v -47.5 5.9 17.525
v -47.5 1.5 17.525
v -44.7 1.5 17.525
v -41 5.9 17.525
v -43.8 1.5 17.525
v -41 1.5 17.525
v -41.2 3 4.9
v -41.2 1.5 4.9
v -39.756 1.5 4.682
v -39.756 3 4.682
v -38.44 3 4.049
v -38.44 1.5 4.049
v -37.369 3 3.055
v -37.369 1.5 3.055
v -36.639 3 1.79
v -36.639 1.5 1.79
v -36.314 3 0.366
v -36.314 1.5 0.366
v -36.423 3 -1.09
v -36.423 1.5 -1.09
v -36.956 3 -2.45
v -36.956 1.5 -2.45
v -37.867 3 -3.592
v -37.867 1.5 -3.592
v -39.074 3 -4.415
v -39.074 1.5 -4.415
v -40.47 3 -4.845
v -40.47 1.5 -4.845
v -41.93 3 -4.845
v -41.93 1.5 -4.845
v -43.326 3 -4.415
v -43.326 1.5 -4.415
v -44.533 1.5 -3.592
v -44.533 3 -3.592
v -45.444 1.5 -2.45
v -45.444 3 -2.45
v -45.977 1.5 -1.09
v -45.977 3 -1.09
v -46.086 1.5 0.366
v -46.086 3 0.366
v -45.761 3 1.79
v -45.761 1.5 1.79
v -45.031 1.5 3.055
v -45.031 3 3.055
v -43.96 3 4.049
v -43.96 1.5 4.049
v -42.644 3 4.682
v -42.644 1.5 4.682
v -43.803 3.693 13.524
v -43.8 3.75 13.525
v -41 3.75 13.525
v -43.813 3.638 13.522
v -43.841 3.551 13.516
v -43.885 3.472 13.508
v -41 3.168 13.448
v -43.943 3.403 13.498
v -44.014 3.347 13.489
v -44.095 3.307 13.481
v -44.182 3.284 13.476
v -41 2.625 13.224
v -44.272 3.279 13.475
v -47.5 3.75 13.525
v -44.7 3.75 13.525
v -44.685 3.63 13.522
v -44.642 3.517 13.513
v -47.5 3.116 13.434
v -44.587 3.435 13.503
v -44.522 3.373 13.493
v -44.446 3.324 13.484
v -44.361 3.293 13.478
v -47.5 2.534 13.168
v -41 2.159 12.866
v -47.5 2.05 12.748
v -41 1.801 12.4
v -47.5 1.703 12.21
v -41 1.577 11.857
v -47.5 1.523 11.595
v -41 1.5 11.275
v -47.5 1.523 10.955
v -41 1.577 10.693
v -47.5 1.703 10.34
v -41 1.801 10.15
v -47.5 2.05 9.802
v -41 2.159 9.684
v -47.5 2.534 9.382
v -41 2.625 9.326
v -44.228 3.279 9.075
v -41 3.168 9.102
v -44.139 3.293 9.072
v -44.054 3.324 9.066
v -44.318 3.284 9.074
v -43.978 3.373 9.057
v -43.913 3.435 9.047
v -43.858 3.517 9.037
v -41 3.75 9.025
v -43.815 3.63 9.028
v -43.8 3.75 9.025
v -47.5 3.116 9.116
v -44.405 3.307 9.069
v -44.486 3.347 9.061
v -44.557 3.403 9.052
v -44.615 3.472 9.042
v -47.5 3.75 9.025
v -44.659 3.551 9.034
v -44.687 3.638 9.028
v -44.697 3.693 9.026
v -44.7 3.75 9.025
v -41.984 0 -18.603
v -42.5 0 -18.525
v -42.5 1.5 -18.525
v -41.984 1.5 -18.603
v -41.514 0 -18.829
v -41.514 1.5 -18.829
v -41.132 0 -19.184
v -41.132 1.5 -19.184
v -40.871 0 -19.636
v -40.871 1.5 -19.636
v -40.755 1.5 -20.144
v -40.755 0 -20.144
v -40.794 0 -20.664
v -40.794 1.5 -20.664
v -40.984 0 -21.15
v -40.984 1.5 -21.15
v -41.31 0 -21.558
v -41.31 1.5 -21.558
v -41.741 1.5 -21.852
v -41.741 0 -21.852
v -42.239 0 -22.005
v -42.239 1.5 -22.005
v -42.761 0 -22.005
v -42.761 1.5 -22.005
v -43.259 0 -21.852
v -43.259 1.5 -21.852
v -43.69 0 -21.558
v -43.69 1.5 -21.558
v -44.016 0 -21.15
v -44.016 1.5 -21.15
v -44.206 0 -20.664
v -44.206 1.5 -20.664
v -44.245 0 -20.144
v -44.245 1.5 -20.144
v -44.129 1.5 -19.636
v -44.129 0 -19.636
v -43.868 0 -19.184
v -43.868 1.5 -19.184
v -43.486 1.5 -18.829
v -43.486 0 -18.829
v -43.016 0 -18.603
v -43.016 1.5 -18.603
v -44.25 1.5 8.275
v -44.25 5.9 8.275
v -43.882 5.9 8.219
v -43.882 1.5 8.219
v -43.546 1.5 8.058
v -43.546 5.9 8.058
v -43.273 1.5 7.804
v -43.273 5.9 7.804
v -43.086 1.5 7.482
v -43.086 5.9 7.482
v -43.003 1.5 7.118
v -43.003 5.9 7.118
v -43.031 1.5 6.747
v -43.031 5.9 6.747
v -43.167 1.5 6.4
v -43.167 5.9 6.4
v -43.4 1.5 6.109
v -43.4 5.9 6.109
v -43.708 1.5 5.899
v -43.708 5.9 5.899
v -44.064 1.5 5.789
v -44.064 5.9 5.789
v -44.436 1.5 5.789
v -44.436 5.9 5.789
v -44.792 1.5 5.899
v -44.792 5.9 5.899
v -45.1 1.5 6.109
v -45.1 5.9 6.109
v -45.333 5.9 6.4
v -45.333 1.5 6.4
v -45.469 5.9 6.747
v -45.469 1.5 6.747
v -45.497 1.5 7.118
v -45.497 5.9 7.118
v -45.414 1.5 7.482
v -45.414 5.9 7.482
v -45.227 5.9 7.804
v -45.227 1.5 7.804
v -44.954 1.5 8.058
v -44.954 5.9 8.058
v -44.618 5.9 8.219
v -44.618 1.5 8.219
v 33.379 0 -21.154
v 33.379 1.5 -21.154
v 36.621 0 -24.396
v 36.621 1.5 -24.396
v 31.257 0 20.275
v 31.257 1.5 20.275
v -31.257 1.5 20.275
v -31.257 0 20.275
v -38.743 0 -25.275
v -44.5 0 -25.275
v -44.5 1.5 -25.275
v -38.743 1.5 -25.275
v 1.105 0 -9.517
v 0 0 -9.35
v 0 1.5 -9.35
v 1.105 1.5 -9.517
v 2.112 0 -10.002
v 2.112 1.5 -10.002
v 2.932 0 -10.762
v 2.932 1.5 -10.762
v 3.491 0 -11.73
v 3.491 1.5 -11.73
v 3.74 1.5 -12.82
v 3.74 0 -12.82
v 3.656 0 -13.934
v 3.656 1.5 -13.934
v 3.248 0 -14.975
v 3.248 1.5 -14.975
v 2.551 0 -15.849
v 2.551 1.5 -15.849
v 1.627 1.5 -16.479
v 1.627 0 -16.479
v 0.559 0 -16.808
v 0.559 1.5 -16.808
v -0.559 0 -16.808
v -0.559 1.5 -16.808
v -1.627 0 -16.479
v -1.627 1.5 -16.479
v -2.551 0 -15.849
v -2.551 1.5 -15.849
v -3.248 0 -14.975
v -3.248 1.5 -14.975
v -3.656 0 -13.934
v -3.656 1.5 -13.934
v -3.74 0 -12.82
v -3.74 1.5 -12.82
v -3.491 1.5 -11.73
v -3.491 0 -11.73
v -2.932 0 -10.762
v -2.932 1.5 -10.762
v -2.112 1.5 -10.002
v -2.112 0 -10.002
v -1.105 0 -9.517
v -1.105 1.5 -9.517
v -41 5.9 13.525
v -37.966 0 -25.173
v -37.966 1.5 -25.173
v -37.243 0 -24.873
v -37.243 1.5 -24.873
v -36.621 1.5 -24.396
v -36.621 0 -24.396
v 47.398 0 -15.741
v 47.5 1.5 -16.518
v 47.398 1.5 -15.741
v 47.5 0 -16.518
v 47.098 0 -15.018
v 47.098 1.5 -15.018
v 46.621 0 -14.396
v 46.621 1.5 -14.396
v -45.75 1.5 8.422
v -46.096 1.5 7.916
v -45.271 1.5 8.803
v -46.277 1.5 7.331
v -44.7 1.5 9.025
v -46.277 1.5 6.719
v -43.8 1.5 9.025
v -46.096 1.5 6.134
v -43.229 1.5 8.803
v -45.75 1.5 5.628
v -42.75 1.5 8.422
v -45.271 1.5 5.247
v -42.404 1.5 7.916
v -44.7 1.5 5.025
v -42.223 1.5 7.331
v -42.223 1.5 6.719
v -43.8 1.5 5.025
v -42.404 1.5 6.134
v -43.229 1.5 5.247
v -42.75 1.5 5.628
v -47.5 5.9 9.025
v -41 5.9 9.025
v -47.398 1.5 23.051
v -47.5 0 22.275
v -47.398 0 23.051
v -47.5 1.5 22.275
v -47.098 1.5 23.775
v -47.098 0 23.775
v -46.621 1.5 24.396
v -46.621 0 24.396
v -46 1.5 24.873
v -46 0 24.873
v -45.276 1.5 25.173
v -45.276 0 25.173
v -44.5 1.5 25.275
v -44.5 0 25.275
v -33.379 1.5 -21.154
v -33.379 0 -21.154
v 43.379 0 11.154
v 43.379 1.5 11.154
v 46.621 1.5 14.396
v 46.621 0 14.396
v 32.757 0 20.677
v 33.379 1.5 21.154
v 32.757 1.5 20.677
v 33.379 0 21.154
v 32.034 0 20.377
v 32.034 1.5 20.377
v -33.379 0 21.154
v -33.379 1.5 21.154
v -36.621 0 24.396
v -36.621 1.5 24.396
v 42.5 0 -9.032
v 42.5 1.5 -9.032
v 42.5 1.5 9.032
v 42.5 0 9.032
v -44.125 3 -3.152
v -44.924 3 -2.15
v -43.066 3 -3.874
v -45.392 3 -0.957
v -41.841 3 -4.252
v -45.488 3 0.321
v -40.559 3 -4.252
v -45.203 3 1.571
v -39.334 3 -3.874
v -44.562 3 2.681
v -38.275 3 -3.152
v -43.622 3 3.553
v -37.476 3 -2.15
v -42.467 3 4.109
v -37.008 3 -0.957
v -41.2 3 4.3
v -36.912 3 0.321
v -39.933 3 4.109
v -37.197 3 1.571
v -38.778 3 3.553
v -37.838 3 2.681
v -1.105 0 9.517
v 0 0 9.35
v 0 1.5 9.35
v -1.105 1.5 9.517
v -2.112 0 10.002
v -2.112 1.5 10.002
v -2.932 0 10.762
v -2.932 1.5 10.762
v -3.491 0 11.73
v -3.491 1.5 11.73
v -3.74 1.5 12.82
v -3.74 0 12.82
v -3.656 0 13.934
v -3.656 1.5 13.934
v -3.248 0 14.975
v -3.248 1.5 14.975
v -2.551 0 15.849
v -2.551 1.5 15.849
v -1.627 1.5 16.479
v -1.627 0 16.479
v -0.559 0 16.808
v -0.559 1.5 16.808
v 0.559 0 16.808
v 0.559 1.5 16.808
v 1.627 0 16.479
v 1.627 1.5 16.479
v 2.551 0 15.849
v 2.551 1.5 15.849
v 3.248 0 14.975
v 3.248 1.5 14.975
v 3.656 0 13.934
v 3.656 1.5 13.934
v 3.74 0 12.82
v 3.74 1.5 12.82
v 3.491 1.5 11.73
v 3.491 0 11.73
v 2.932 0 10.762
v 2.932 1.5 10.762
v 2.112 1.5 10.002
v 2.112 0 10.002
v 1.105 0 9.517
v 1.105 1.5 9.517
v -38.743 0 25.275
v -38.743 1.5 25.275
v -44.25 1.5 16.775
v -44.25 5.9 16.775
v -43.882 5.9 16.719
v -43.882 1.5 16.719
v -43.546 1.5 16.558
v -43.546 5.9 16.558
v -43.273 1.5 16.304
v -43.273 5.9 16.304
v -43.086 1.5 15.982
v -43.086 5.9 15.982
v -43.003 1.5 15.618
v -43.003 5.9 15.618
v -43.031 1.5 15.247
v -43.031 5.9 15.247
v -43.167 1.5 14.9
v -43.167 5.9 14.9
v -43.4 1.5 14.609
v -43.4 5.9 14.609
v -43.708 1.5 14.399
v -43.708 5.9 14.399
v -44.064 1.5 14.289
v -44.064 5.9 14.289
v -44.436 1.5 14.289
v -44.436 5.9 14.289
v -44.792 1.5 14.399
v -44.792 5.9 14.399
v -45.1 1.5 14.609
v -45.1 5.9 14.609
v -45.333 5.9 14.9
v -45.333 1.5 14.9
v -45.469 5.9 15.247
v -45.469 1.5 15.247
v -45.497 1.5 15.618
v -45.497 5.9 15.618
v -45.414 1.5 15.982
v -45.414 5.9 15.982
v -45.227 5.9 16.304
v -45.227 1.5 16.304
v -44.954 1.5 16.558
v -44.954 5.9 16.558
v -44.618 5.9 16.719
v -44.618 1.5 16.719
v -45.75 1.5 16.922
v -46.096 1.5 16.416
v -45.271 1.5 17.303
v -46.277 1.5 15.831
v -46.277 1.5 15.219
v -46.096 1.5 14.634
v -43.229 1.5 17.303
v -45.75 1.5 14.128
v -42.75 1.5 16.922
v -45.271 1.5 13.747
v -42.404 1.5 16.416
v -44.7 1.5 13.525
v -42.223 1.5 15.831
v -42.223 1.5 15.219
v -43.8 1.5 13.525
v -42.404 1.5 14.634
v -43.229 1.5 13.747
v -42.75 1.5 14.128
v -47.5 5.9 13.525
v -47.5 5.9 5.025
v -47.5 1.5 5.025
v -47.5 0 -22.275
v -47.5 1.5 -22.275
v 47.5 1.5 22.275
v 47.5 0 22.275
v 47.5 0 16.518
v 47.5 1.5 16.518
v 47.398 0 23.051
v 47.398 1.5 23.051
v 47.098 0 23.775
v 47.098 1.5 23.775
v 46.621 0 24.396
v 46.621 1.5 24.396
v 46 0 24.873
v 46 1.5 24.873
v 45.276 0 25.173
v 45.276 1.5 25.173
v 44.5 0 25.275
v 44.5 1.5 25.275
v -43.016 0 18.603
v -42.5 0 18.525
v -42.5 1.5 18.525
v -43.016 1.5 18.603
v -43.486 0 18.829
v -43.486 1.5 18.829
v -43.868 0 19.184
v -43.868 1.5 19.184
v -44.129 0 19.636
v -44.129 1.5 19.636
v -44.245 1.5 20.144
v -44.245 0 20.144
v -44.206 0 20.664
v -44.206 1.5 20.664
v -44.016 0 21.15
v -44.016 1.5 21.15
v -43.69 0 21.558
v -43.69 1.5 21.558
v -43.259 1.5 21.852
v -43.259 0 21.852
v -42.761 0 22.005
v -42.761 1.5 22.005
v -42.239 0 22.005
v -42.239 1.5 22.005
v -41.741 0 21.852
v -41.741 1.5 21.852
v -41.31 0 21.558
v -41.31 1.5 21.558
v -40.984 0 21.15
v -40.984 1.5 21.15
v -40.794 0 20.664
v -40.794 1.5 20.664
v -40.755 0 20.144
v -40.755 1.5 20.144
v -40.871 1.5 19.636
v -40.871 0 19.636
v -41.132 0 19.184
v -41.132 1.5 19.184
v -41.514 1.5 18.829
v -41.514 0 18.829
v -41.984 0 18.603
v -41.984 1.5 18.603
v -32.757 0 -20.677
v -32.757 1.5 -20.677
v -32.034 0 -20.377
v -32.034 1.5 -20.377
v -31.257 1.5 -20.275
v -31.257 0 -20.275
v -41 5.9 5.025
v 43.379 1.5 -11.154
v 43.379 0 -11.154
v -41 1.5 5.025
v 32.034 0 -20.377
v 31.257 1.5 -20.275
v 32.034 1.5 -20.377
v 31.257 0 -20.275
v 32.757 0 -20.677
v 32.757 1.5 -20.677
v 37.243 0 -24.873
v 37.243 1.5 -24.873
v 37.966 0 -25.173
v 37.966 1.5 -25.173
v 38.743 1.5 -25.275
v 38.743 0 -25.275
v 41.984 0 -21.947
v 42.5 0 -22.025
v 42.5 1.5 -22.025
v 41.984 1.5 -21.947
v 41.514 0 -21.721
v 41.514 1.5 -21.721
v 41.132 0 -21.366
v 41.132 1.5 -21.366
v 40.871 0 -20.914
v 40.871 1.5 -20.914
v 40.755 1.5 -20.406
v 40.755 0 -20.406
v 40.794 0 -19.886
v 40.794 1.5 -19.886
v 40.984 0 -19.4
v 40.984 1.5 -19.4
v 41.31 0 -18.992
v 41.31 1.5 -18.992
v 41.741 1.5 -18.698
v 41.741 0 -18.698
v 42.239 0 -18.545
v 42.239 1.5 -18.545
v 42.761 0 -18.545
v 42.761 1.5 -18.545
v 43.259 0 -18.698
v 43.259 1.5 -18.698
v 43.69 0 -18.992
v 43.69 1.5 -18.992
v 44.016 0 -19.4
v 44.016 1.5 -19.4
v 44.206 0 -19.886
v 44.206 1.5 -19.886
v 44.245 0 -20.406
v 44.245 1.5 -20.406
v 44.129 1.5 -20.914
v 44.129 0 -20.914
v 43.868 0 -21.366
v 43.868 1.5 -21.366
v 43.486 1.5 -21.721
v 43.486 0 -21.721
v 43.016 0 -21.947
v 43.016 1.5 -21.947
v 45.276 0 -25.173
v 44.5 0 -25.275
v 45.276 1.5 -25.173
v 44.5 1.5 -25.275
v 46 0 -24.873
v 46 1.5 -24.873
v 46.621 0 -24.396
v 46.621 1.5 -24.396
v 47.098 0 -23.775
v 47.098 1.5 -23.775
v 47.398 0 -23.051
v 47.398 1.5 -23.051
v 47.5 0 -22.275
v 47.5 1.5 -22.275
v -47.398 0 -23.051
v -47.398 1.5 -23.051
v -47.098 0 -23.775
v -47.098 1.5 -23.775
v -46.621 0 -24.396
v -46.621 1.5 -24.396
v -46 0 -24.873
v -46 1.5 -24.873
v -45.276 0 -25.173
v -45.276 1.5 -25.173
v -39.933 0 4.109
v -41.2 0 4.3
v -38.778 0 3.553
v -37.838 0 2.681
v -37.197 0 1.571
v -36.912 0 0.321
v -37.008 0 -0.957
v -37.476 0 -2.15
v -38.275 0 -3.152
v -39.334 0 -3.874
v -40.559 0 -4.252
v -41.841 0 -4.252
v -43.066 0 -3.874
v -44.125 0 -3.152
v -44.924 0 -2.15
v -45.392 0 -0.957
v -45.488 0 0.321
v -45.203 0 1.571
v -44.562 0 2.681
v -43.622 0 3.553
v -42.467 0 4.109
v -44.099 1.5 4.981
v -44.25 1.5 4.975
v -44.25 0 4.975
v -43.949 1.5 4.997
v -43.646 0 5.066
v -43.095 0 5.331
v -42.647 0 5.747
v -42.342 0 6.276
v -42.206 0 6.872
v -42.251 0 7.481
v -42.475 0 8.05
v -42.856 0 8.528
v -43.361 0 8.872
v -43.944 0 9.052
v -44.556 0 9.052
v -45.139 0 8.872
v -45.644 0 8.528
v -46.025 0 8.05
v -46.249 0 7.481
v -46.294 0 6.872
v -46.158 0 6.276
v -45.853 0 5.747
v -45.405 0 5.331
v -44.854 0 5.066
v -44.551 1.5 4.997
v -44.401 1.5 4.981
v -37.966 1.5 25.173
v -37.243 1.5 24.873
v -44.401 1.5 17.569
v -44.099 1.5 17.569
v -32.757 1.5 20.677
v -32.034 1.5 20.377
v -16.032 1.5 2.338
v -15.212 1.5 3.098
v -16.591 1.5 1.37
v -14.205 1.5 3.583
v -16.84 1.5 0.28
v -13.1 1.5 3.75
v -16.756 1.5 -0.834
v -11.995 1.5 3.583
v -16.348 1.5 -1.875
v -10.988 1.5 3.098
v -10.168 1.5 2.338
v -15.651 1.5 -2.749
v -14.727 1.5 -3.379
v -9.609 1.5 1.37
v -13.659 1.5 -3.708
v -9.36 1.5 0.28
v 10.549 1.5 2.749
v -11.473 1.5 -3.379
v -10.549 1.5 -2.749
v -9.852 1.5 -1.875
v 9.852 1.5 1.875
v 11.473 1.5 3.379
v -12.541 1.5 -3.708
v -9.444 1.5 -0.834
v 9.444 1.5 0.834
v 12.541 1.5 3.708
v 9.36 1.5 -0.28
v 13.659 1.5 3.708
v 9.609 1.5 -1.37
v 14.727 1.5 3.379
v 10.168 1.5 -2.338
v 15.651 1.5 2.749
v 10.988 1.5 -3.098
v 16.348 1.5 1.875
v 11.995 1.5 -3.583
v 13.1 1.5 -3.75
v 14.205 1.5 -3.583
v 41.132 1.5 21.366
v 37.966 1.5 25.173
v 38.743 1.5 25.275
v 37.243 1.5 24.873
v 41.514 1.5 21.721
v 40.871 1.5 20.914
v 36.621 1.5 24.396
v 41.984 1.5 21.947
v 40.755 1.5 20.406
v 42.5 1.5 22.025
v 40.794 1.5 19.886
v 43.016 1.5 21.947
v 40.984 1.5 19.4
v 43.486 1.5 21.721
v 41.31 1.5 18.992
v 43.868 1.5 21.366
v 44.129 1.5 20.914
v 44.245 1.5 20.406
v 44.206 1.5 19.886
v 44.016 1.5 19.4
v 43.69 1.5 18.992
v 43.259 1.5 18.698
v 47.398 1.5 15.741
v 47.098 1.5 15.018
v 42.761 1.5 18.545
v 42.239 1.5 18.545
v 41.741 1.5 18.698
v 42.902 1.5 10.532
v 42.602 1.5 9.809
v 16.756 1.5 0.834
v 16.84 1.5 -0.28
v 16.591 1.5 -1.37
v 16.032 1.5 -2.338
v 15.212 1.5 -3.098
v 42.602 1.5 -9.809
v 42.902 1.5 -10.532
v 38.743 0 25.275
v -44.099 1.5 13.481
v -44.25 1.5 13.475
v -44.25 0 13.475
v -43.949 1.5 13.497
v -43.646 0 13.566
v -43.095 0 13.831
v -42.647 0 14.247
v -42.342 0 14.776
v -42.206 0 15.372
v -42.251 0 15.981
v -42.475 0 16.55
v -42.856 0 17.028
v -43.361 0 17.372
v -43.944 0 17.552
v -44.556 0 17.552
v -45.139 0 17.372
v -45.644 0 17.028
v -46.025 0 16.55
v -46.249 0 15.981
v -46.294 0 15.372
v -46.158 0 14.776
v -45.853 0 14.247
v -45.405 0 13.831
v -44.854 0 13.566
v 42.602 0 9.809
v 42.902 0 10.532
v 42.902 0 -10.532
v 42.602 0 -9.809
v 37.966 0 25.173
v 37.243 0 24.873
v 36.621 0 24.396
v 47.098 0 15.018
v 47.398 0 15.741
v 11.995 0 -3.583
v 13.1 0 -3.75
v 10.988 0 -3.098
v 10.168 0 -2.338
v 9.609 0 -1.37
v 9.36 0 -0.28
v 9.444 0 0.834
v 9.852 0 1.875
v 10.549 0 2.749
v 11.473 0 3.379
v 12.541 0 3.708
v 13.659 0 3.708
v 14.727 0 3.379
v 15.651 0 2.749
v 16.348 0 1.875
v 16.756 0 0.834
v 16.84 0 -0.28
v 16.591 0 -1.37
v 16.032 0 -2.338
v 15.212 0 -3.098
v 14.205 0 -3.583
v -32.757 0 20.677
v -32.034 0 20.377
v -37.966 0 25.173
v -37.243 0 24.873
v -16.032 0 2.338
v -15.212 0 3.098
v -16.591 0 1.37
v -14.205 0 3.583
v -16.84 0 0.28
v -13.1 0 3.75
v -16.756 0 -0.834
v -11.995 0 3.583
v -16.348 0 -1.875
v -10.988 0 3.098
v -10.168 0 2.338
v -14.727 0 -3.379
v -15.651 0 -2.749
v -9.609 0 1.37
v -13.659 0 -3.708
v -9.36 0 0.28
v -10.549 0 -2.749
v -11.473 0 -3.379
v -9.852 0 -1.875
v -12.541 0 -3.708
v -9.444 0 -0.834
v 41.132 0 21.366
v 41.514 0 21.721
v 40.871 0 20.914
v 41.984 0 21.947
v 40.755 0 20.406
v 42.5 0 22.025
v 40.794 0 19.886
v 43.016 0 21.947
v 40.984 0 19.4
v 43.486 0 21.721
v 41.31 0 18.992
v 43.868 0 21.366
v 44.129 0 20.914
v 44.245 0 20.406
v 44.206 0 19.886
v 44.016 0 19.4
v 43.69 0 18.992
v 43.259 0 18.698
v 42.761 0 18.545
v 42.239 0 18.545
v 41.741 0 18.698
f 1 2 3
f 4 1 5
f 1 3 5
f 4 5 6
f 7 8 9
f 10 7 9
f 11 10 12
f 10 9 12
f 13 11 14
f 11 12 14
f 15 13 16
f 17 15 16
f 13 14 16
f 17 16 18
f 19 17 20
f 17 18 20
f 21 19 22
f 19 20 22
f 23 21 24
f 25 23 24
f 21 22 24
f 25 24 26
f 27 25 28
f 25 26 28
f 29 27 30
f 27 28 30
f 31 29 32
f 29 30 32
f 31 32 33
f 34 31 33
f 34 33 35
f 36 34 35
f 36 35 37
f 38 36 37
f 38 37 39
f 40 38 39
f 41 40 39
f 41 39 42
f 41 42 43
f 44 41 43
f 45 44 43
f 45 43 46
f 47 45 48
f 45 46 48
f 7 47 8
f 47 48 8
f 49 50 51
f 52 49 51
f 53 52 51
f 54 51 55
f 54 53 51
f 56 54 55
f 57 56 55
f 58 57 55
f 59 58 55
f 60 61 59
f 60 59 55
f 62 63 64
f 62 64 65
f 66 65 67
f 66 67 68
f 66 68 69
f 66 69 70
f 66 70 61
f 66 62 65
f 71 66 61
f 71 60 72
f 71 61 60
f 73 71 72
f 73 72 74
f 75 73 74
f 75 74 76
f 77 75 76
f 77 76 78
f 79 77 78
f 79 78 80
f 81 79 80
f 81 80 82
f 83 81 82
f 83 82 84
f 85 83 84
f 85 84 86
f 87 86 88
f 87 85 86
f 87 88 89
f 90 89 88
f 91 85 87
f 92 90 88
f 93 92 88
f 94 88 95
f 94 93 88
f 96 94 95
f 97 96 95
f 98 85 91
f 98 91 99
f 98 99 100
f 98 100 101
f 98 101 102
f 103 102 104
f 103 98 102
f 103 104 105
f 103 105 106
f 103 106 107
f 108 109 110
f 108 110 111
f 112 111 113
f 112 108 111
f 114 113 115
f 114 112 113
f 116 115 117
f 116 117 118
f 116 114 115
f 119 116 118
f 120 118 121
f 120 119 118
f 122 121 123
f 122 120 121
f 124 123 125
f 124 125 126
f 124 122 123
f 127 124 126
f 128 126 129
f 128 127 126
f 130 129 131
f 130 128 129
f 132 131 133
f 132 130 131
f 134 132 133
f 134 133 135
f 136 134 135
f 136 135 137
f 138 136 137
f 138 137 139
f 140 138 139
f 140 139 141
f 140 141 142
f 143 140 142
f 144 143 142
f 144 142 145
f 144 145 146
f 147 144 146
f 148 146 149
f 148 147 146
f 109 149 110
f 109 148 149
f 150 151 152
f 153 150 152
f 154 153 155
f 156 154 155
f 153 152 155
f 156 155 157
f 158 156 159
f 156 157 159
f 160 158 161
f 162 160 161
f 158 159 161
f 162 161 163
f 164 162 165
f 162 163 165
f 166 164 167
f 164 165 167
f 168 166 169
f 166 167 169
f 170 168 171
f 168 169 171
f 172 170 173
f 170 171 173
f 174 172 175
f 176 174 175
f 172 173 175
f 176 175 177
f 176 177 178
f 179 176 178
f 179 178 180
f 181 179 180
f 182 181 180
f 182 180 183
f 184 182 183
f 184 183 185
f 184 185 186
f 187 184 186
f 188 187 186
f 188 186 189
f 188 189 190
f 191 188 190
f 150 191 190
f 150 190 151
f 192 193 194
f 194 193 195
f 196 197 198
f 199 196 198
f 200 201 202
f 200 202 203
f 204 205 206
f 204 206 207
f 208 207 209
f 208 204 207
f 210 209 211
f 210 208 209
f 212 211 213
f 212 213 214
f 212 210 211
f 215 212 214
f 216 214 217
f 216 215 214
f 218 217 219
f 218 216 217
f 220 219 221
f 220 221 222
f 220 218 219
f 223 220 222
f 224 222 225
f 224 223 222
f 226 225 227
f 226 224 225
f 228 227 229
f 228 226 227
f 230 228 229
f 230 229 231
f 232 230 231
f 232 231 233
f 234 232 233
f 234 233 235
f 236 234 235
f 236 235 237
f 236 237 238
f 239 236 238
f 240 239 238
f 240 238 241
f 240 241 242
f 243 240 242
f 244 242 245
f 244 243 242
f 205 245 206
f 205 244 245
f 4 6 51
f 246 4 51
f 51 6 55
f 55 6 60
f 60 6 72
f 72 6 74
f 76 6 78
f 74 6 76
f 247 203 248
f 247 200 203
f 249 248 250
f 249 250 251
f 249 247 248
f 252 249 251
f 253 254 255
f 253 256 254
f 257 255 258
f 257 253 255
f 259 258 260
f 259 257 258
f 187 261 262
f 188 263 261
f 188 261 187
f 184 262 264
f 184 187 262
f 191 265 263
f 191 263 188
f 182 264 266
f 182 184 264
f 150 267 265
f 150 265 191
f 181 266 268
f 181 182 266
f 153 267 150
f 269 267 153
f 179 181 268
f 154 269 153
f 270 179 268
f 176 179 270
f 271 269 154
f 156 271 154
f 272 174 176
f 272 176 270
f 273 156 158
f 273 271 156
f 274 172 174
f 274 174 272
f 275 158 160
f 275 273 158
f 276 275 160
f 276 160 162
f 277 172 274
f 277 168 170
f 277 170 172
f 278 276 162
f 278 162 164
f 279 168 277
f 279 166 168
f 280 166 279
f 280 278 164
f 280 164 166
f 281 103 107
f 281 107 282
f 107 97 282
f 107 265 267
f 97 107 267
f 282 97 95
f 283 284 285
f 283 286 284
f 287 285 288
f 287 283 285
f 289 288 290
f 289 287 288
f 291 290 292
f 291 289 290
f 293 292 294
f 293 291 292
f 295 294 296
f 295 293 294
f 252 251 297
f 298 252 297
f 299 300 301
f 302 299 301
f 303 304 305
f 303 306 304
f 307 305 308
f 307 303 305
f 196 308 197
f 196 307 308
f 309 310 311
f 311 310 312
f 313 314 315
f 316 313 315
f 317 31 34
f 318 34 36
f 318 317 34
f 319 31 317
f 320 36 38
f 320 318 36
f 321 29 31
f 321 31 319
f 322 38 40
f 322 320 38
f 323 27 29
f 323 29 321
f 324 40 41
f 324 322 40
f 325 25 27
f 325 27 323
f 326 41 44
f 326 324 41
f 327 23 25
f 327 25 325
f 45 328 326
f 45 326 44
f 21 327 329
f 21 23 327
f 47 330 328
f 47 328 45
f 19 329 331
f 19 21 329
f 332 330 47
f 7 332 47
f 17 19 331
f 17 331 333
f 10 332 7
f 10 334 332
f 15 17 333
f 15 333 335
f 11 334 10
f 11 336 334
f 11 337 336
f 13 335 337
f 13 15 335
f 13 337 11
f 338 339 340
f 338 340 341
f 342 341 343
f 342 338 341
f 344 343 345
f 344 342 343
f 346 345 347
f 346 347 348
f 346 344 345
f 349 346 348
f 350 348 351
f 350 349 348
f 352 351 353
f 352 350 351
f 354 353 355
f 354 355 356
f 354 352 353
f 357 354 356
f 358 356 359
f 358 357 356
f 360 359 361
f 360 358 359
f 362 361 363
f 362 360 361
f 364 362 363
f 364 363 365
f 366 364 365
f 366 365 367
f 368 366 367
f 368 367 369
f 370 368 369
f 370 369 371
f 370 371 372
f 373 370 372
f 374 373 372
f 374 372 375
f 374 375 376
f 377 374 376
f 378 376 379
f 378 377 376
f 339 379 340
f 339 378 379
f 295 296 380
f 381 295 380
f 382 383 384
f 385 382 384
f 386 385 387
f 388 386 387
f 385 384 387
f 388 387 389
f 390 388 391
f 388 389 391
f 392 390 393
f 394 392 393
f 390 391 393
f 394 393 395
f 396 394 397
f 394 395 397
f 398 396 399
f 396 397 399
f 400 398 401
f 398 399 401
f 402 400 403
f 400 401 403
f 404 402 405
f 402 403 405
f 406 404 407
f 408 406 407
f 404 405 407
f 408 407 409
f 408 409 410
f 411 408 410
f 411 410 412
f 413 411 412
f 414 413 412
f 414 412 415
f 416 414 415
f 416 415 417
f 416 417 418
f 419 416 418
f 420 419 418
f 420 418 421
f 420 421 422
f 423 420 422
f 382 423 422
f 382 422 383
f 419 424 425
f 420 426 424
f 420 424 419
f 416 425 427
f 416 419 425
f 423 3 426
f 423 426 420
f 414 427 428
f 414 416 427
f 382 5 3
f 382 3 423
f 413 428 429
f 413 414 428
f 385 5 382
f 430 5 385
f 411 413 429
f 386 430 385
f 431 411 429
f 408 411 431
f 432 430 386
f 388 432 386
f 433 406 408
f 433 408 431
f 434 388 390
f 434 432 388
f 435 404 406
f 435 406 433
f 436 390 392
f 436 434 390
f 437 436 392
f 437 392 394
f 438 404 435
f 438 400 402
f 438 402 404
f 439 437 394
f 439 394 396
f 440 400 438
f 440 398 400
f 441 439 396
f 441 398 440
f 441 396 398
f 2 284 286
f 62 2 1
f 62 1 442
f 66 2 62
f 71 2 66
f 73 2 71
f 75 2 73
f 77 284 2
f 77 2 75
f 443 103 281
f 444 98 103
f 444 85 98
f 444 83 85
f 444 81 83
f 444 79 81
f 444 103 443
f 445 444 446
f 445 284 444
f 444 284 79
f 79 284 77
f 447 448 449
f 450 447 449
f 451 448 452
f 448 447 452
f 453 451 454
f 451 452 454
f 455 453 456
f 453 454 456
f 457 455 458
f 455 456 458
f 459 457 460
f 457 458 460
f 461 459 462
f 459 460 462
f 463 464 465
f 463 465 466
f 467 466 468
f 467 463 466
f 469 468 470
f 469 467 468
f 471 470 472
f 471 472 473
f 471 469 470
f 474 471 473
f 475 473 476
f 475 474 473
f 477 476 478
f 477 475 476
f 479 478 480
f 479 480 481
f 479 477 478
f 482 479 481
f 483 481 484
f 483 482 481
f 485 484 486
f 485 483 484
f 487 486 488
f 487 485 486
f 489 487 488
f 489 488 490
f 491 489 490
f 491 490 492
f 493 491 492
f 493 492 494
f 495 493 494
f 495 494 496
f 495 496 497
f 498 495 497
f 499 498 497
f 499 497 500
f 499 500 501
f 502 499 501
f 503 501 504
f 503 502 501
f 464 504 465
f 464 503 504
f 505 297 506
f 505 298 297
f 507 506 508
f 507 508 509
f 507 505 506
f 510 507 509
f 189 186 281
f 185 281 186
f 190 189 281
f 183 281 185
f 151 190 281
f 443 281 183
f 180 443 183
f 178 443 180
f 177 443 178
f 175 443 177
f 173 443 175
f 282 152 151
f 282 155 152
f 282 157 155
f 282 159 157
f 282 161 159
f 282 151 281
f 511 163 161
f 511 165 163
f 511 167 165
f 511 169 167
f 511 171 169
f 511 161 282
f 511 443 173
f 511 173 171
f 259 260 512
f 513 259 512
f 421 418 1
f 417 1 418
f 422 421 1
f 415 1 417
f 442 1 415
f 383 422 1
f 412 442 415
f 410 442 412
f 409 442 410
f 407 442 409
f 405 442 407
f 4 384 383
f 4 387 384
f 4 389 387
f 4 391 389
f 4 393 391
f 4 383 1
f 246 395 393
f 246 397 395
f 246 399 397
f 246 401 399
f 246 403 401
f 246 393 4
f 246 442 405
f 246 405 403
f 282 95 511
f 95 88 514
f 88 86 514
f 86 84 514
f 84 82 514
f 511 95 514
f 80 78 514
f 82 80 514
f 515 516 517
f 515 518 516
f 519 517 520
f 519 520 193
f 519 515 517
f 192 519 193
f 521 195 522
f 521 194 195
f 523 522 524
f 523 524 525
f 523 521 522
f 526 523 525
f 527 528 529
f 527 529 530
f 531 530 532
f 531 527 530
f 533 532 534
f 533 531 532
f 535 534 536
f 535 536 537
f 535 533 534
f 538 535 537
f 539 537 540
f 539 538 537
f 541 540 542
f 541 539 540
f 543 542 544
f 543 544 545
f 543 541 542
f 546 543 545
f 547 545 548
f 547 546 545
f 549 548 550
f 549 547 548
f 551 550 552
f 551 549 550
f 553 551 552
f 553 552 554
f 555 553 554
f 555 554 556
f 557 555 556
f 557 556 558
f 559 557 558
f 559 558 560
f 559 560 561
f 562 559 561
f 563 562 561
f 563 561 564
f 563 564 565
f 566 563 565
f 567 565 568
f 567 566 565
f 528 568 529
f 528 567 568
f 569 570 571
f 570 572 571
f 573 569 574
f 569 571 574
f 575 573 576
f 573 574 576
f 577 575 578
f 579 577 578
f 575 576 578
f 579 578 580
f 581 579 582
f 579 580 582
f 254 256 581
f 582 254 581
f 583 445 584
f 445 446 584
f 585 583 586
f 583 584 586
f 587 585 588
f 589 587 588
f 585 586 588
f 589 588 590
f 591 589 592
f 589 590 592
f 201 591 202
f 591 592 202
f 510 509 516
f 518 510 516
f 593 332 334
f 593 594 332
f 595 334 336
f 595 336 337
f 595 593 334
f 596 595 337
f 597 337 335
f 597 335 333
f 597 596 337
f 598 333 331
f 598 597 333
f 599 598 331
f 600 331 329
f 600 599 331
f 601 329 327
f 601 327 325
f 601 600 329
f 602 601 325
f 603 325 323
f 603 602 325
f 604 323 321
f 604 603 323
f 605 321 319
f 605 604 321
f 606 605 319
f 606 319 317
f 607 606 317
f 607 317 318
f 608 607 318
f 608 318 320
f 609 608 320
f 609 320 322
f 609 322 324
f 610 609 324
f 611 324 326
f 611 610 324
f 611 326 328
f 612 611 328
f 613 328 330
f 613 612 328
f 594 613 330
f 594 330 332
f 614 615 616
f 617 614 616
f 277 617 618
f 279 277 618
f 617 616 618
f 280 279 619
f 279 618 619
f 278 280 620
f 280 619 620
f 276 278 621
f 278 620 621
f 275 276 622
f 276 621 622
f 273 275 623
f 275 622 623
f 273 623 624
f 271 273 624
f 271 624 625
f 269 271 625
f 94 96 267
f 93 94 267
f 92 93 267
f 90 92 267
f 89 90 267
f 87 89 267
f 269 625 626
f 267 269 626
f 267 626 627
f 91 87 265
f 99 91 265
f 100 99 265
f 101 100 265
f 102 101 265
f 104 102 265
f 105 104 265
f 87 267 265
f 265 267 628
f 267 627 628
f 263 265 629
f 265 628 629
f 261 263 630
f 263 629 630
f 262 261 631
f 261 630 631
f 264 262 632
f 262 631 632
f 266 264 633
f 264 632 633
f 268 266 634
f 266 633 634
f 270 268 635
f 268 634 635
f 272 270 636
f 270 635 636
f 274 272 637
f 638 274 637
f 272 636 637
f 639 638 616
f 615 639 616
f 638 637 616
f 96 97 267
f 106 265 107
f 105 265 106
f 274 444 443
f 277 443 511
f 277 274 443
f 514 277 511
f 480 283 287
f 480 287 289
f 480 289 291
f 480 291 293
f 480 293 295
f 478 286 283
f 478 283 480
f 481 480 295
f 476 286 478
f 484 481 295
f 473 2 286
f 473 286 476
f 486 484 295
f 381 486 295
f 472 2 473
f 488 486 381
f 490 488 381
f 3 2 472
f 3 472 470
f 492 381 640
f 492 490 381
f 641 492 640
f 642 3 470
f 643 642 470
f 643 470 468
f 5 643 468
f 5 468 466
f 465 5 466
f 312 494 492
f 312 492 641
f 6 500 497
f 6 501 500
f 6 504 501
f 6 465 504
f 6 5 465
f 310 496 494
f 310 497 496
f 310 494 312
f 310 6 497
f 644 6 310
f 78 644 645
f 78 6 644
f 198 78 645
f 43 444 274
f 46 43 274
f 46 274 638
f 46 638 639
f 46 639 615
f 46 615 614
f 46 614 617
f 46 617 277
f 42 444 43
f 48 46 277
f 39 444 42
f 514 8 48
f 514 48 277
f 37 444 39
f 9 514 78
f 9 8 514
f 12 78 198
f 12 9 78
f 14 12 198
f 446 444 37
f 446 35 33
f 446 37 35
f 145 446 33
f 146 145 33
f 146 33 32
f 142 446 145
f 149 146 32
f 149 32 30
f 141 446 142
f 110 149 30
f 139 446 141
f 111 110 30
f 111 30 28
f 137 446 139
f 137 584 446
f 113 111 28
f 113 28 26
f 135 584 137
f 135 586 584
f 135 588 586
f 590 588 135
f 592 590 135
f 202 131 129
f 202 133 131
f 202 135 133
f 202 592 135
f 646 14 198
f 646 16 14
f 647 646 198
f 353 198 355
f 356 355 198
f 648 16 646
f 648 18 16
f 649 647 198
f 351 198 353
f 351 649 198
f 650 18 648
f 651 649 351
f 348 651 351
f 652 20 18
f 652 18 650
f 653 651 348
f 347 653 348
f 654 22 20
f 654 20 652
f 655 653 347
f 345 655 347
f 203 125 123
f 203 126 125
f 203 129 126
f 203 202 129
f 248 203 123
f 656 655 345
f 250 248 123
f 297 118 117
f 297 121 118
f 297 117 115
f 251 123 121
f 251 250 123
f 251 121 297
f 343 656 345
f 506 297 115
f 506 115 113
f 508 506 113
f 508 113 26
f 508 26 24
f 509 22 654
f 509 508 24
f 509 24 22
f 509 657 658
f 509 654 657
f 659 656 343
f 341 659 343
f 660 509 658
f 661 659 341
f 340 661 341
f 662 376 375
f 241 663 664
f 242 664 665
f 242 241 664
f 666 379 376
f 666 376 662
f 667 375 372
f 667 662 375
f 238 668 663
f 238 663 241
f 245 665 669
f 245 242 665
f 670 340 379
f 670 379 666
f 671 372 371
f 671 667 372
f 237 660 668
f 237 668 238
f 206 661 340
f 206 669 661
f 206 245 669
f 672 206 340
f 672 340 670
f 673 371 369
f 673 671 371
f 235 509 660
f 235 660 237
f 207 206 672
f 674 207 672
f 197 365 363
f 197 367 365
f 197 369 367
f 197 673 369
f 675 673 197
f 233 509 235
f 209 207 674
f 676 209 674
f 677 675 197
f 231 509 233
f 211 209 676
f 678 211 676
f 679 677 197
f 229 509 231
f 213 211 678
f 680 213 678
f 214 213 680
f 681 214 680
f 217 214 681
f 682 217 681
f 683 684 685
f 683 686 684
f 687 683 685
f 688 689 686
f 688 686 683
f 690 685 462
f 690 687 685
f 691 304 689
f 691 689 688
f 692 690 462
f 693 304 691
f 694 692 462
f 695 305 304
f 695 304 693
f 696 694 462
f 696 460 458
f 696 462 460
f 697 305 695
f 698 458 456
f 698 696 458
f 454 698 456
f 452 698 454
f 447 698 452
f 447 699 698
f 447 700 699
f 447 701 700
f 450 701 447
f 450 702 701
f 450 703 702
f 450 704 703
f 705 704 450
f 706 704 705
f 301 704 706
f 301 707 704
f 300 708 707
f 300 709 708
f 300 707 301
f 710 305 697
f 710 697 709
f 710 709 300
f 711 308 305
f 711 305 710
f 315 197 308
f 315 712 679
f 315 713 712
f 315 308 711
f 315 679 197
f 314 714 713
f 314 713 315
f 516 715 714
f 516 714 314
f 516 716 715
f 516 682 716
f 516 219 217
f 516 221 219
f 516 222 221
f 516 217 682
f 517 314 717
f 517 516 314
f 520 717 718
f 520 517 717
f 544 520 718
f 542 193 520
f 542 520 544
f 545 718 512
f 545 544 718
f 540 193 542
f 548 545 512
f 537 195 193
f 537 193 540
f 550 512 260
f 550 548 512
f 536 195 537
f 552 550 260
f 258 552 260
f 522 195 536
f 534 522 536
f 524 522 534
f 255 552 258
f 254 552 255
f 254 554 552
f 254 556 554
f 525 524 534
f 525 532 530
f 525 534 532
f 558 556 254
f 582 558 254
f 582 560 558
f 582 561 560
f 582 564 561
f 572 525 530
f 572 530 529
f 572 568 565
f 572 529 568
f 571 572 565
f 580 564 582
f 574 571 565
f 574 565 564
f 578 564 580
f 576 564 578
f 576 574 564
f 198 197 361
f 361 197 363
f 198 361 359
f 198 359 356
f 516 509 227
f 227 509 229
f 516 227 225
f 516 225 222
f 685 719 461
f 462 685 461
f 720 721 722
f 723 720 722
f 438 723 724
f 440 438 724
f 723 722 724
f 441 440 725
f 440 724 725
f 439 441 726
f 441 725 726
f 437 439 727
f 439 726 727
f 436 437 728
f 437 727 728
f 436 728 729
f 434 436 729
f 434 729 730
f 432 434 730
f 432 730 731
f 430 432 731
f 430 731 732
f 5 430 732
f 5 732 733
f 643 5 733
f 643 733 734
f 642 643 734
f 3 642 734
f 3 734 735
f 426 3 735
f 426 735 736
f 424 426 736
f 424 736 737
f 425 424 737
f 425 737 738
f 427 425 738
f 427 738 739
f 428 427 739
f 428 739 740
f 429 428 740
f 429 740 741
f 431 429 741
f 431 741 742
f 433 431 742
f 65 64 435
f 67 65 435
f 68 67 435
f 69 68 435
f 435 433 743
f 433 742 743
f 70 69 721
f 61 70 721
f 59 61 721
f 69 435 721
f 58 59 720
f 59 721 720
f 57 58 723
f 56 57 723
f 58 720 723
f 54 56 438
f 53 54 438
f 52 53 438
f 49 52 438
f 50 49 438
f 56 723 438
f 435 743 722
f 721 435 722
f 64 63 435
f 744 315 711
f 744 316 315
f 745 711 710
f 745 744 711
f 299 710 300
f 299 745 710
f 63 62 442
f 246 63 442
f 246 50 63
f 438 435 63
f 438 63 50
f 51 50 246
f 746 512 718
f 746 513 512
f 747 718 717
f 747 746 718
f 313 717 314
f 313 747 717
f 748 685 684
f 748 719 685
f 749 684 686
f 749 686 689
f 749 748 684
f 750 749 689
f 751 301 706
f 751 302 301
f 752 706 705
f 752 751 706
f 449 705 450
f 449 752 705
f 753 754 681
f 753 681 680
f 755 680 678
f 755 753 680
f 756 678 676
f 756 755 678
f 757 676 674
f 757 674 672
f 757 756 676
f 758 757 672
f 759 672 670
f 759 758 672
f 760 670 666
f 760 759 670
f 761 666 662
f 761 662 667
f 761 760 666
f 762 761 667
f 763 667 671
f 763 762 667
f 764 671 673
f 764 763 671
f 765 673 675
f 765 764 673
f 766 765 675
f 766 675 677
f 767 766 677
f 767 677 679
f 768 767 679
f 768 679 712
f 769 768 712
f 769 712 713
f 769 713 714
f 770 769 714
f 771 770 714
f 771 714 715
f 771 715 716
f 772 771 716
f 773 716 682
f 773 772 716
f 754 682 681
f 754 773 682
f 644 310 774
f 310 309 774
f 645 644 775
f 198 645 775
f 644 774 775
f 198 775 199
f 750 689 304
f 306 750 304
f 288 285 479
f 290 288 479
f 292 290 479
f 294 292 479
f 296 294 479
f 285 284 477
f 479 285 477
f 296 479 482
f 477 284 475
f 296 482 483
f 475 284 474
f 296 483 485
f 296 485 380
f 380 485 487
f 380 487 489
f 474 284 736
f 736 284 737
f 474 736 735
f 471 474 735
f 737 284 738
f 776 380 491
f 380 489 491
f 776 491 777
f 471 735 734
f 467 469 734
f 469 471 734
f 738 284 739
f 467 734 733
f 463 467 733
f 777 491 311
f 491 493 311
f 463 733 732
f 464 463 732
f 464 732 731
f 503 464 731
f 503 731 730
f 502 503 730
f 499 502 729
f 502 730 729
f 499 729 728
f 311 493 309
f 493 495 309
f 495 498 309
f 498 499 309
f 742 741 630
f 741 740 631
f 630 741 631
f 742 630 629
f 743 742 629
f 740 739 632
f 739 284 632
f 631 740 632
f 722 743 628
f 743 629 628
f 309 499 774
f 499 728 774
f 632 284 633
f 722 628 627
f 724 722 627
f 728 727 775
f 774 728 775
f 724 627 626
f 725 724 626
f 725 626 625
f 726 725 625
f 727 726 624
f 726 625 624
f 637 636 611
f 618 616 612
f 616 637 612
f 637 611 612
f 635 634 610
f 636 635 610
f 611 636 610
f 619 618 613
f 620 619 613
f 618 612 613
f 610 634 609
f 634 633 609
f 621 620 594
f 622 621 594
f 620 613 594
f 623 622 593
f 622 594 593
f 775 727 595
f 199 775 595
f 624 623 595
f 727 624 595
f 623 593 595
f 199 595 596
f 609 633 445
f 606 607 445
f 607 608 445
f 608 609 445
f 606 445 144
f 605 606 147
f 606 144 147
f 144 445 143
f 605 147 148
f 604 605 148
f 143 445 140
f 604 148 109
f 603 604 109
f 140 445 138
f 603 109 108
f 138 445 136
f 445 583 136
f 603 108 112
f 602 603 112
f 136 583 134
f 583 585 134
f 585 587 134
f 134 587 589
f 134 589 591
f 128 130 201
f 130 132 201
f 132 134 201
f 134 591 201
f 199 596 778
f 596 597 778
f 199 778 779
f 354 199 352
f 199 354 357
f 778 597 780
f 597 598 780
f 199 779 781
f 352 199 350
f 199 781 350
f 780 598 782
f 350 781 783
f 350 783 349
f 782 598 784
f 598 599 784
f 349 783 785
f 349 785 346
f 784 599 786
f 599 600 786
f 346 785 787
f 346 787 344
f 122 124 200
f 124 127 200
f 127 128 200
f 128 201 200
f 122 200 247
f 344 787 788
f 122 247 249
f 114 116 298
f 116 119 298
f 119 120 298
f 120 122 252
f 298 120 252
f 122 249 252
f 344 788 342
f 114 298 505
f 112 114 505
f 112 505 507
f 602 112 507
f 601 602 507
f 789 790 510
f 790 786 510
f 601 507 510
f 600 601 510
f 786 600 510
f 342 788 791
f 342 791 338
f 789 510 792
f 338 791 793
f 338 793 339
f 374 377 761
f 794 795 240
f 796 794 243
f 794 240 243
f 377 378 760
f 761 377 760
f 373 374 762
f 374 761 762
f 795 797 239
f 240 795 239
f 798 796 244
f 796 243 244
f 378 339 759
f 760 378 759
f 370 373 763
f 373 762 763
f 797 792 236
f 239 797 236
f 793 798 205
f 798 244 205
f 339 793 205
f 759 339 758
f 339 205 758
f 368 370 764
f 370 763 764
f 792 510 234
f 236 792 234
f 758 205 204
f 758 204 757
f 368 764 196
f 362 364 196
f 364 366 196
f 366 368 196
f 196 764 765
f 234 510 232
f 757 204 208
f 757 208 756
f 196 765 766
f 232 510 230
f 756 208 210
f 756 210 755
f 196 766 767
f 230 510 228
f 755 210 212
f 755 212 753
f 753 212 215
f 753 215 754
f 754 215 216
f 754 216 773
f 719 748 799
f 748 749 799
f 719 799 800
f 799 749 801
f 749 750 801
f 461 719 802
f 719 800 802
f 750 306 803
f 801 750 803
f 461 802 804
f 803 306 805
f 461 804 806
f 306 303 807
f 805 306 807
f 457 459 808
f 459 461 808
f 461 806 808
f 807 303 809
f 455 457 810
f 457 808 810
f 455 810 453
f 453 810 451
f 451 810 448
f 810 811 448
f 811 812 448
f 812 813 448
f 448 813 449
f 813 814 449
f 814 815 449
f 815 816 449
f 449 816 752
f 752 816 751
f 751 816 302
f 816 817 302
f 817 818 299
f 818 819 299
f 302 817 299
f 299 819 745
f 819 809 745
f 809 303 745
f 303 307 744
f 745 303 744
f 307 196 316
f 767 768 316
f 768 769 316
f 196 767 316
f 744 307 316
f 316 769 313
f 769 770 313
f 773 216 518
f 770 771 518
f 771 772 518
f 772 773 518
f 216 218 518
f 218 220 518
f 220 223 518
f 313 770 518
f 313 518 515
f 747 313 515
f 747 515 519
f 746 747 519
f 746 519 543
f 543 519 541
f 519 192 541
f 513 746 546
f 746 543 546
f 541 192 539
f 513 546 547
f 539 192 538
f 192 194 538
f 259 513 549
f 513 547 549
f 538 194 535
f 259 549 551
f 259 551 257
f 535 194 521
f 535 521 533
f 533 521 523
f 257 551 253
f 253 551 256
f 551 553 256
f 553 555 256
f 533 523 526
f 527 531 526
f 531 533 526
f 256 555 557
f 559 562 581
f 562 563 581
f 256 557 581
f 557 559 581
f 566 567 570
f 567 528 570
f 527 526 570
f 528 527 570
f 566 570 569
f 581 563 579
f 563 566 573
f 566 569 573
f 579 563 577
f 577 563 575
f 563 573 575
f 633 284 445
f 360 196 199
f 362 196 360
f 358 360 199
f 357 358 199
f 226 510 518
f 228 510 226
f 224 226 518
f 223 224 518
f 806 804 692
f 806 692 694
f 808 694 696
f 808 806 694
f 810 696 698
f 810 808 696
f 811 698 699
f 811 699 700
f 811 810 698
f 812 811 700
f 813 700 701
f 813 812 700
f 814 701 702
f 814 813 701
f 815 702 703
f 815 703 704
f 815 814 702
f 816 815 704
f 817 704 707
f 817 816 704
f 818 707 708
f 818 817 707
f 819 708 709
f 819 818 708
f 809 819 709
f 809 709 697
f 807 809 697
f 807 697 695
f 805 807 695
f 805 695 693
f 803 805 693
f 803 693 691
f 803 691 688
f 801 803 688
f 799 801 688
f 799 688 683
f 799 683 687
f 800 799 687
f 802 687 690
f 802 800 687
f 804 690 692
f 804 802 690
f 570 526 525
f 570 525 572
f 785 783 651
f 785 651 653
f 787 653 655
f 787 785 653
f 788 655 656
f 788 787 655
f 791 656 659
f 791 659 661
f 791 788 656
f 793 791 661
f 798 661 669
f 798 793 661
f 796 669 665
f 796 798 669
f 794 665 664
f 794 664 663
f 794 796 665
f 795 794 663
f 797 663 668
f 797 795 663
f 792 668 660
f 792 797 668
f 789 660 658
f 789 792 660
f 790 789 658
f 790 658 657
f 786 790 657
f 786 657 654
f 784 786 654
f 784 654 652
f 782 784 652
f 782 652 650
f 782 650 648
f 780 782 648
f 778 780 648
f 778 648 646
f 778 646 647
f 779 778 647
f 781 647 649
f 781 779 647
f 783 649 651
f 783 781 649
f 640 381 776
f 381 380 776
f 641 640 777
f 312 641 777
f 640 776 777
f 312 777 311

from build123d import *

# Parameters (mm, degrees)
SKETCH1_W           = 95
SKETCH1_H           = 50.55
SKETCH1_R           = 1.75
SKETCH1_R_2         = 3.75
SKETCH1_R_3         = 4.3
BOSS_EXTRUDE1_DEPTH = 1.5
CUT_EXTRUDE1_DEPTH  = 1.5
FILLET1_R           = 3
SKETCH3_R           = 4.9
SKETCH3_R_2         = 4.3
BOSS_EXTRUDE2_DEPTH = 1.5
SKETCH5_W           = 6.5
SKETCH5_H           = 4
BOSS_EXTRUDE3_DEPTH = 4.4
CUT_EXTRUDE2_REACH  = 56.128
SKETCH6_R           = 1.25
SKETCH8_R           = 2.05
CUT_EXTRUDE3_DEPTH  = 1.5
FILLET2_R           = 2.25


with BuildPart() as part:
    # Sketch1 → Boss-Extrude1 (new body)
    with BuildSketch(Plane(origin=(0, 0, 0), x_dir=(1, 0, 0), z_dir=(0, 1, 0))):
        Rectangle(SKETCH1_W, SKETCH1_H)
        with Locations(Location((-42.5, 20.275, 0), (0, 0, 270))):
            Circle(SKETCH1_R, mode=Mode.SUBTRACT)
        with Locations(Location((42.5, 20.275, 0), (0, 0, 90))):
            Circle(SKETCH1_R, mode=Mode.SUBTRACT)
        with Locations(Location((42.5, -20.275, 0), (0, 0, 270))):
            Circle(SKETCH1_R, mode=Mode.SUBTRACT)
        with Locations(Location((-42.5, -20.275, 0), (0, 0, 90))):
            Circle(SKETCH1_R, mode=Mode.SUBTRACT)
        with Locations(Location((-13.1, 0, 0), (0, 0, 270))):
            Circle(SKETCH1_R_2, mode=Mode.SUBTRACT)
        with Locations(Location((13.1, 0, 0), (0, 0, 90))):
            Circle(SKETCH1_R_2, mode=Mode.SUBTRACT)
        with Locations(Location((0, 13.1, 0), (0, 0, 270))):
            Circle(SKETCH1_R_2, mode=Mode.SUBTRACT)
        with Locations(Location((0, -13.1, 0), (0, 0, 90))):
            Circle(SKETCH1_R_2, mode=Mode.SUBTRACT)
        with Locations(Location((-41.2, 0, 0), (0, 0, 270))):
            Circle(SKETCH1_R_3, mode=Mode.SUBTRACT)
    extrude(amount=BOSS_EXTRUDE1_DEPTH)

    # Sketch2 → Cut-Extrude1 (cut)
    with BuildSketch(Plane(origin=(0, 1.5, 0), x_dir=(1, 0, 0), z_dir=(0, 1, 0))):
        Polygon((-32.5, 20.275), (32.5, 20.275), (37.5, 25.275), (-37.5, 25.275), align=None)
        Polygon((37.5, -25.275), (32.5, -20.275), (-32.5, -20.275), (-37.5, -25.275), align=None)
        Polygon((47.5, -15.275), (47.5, 15.275), (42.5, 10.275), (42.5, -10.275), align=None)
    extrude(amount=-CUT_EXTRUDE1_DEPTH, mode=Mode.SUBTRACT)

    # Fillet1
    fillet1_edges = [part.edges().sort_by_distance(p)[0] for p in [
        (37.5, 0.75, -25.275),
        (32.5, 0.75, -20.275),
        (-32.5, 0.75, -20.275),
        (-37.5, 0.75, -25.275),
        (-37.5, 0.75, 25.275),
        (-32.5, 0.75, 20.275),
        (32.5, 0.75, 20.275),
        (37.5, 0.75, 25.275),
        (47.5, 0.75, 25.275),
        (-47.5, 0.75, 25.275),
        (-47.5, 0.75, -25.275),
        (47.5, 0.75, -25.275),
        (47.5, 0.75, 15.275),
        (42.5, 0.75, 10.275),
        (42.5, 0.75, -10.275),
        (47.5, 0.75, -15.275),
    ]]
    fillet(fillet1_edges, radius=FILLET1_R)

    # Sketch3 → Boss-Extrude2 (add)
    with BuildSketch(Plane(origin=(0, 1.5, 0), x_dir=(1, 0, 0), z_dir=(0, 1, 0))):
        with Locations(Location((-41.2, 0, 0), (0, 0, 270))):
            Circle(SKETCH3_R)
        with Locations(Location((-41.2, 0, 0), (0, 0, 270))):
            Circle(SKETCH3_R_2, mode=Mode.SUBTRACT)
    extrude(amount=BOSS_EXTRUDE2_DEPTH)

    # Sketch5 → Boss-Extrude3 (add)
    with BuildSketch(Plane(origin=(0, 1.5, 0), x_dir=(1, 0, 0), z_dir=(0, 1, 0))):
        with Locations((-44.25, -7.025)):
            Rectangle(SKETCH5_W, SKETCH5_H)
        with Locations((-44.25, -15.525)):
            Rectangle(SKETCH5_W, SKETCH5_H)
    extrude(amount=BOSS_EXTRUDE3_DEPTH)

    # Sketch6 → Cut-Extrude2 (cut, up to next)
    with BuildSketch(Plane(origin=(0, 5.9, 0), x_dir=(1, 0, 0), z_dir=(0, 1, 0)), mode=Mode.PRIVATE) as cut_extrude2_sk1:
        with Locations(Location((-44.25, -7.025, 0), (0, 0, 270))):
            Circle(SKETCH6_R)
    cut_extrude2_tool1 = extrude(cut_extrude2_sk1.sketch, amount=-CUT_EXTRUDE2_REACH, mode=Mode.PRIVATE) & part.part
    # Sketch6 → Cut-Extrude2 (cut, up to next)
    with BuildSketch(Plane(origin=(0, 5.9, 0), x_dir=(1, 0, 0), z_dir=(0, 1, 0)), mode=Mode.PRIVATE) as cut_extrude2_sk2:
        with Locations(Location((-44.25, -15.525, 0), (0, 0, 270))):
            Circle(SKETCH6_R)
    cut_extrude2_tool2 = extrude(cut_extrude2_sk2.sketch, amount=-CUT_EXTRUDE2_REACH, mode=Mode.PRIVATE) & part.part
    add(cut_extrude2_tool1.solids().sort_by_distance((-44.25, 5.9, 7.025))[0], mode=Mode.SUBTRACT)
    add(cut_extrude2_tool2.solids().sort_by_distance((-44.25, 5.9, 15.525))[0], mode=Mode.SUBTRACT)

    # Sketch8 → Cut-Extrude3 (cut)
    with BuildSketch(Plane.XZ):
        with Locations(Location((-44.25, 15.525, 0), (0, 0, 270))):
            Circle(SKETCH8_R)
        with Locations(Location((-44.25, 7.025, 0), (0, 0, 270))):
            Circle(SKETCH8_R)
    extrude(amount=-CUT_EXTRUDE3_DEPTH, mode=Mode.SUBTRACT)

    # Fillet2
    # the kernel refuses this fillet: 2.25 mm, written as the material it adds along each edge
    with BuildSketch(Plane(origin=(-39.075, 1.5, 13.525), x_dir=(0, 0, -1), z_dir=(-1, 0, 0))) as fillet2_piece_1_section:
        with BuildLine():
            CenterArc((FILLET2_R, -FILLET2_R), FILLET2_R, 90, 90)
            Line((0, -FILLET2_R), (0, 0))
            Line((0, 0), (FILLET2_R, 0))
        make_face()
    fillet2_piece_1 = extrude(amount=8.425, mode=Mode.PRIVATE)
    fillet2_piece_1 = fillet2_piece_1 - Plane(origin=(-44.25, 1.998463369, 15.525), x_dir=(0, 0, -1), z_dir=(0, -1, 0)) * Cylinder(2.05, 26, mode=Mode.PRIVATE)
    fillet2_piece_1 = split(fillet2_piece_1, bisect_by=Plane(origin=(-41, 1.998463369, 13.018330937), z_dir=(-1, 0, 0)), keep=Keep.TOP, mode=Mode.PRIVATE)
    add(fillet2_piece_1)
    with BuildSketch(Plane(origin=(-41, 1.5, 13.525), x_dir=(0, 0, -1), z_dir=(-1, 0, 0))) as fillet2_piece_2_section:
        with BuildLine():
            CenterArc((FILLET2_R, -FILLET2_R), FILLET2_R, 90, 90)
            Line((0, -FILLET2_R), (0, 0))
            Line((0, 0), (FILLET2_R, 0))
        make_face()
    fillet2_piece_2 = extrude(amount=8.425, mode=Mode.PRIVATE)
    fillet2_piece_2 = split(fillet2_piece_2, bisect_by=Plane(origin=(-47.5, 1.998463369, 13.018330937), z_dir=(1, 0, 0)), keep=Keep.TOP, mode=Mode.PRIVATE)
    fillet2_piece_2 = fillet2_piece_2 - Plane(origin=(-44.25, 1.998463369, 15.525), x_dir=(0, 0, -1), z_dir=(0, -1, 0)) * Cylinder(2.05, 26, mode=Mode.PRIVATE)
    add(fillet2_piece_2)
    with BuildSketch(Plane(origin=(-47.5, 1.5, 9.025), x_dir=(0, 0, 1), z_dir=(1, 0, 0))) as fillet2_piece_3_section:
        with BuildLine():
            CenterArc((FILLET2_R, -FILLET2_R), FILLET2_R, 90, 90)
            Line((0, -FILLET2_R), (0, 0))
            Line((0, 0), (FILLET2_R, 0))
        make_face()
    fillet2_piece_3 = extrude(amount=8.425, mode=Mode.PRIVATE)
    fillet2_piece_3 = fillet2_piece_3 - Plane(origin=(-44.25, 1.998463384, 7.025), x_dir=(0, 0, -1), z_dir=(0, -1, 0)) * Cylinder(2.05, 26, mode=Mode.PRIVATE)
    fillet2_piece_3 = split(fillet2_piece_3, bisect_by=Plane(origin=(-41, 1.998463384, 9.531669097), z_dir=(-1, 0, 0)), keep=Keep.TOP, mode=Mode.PRIVATE)
    add(fillet2_piece_3)
    with BuildSketch(Plane(origin=(-49.425, 1.5, 9.025), x_dir=(0, 0, 1), z_dir=(1, 0, 0))) as fillet2_piece_4_section:
        with BuildLine():
            CenterArc((FILLET2_R, -FILLET2_R), FILLET2_R, 90, 90)
            Line((0, -FILLET2_R), (0, 0))
            Line((0, 0), (FILLET2_R, 0))
        make_face()
    fillet2_piece_4 = extrude(amount=8.425, mode=Mode.PRIVATE)
    fillet2_piece_4 = split(fillet2_piece_4, bisect_by=Plane(origin=(-47.5, 1.998463384, 9.531669097), z_dir=(1, 0, 0)), keep=Keep.TOP, mode=Mode.PRIVATE)
    fillet2_piece_4 = fillet2_piece_4 - Plane(origin=(-44.25, 1.998463384, 7.025), x_dir=(0, 0, -1), z_dir=(0, -1, 0)) * Cylinder(2.05, 26, mode=Mode.PRIVATE)
    add(fillet2_piece_4)


solid = part.part
